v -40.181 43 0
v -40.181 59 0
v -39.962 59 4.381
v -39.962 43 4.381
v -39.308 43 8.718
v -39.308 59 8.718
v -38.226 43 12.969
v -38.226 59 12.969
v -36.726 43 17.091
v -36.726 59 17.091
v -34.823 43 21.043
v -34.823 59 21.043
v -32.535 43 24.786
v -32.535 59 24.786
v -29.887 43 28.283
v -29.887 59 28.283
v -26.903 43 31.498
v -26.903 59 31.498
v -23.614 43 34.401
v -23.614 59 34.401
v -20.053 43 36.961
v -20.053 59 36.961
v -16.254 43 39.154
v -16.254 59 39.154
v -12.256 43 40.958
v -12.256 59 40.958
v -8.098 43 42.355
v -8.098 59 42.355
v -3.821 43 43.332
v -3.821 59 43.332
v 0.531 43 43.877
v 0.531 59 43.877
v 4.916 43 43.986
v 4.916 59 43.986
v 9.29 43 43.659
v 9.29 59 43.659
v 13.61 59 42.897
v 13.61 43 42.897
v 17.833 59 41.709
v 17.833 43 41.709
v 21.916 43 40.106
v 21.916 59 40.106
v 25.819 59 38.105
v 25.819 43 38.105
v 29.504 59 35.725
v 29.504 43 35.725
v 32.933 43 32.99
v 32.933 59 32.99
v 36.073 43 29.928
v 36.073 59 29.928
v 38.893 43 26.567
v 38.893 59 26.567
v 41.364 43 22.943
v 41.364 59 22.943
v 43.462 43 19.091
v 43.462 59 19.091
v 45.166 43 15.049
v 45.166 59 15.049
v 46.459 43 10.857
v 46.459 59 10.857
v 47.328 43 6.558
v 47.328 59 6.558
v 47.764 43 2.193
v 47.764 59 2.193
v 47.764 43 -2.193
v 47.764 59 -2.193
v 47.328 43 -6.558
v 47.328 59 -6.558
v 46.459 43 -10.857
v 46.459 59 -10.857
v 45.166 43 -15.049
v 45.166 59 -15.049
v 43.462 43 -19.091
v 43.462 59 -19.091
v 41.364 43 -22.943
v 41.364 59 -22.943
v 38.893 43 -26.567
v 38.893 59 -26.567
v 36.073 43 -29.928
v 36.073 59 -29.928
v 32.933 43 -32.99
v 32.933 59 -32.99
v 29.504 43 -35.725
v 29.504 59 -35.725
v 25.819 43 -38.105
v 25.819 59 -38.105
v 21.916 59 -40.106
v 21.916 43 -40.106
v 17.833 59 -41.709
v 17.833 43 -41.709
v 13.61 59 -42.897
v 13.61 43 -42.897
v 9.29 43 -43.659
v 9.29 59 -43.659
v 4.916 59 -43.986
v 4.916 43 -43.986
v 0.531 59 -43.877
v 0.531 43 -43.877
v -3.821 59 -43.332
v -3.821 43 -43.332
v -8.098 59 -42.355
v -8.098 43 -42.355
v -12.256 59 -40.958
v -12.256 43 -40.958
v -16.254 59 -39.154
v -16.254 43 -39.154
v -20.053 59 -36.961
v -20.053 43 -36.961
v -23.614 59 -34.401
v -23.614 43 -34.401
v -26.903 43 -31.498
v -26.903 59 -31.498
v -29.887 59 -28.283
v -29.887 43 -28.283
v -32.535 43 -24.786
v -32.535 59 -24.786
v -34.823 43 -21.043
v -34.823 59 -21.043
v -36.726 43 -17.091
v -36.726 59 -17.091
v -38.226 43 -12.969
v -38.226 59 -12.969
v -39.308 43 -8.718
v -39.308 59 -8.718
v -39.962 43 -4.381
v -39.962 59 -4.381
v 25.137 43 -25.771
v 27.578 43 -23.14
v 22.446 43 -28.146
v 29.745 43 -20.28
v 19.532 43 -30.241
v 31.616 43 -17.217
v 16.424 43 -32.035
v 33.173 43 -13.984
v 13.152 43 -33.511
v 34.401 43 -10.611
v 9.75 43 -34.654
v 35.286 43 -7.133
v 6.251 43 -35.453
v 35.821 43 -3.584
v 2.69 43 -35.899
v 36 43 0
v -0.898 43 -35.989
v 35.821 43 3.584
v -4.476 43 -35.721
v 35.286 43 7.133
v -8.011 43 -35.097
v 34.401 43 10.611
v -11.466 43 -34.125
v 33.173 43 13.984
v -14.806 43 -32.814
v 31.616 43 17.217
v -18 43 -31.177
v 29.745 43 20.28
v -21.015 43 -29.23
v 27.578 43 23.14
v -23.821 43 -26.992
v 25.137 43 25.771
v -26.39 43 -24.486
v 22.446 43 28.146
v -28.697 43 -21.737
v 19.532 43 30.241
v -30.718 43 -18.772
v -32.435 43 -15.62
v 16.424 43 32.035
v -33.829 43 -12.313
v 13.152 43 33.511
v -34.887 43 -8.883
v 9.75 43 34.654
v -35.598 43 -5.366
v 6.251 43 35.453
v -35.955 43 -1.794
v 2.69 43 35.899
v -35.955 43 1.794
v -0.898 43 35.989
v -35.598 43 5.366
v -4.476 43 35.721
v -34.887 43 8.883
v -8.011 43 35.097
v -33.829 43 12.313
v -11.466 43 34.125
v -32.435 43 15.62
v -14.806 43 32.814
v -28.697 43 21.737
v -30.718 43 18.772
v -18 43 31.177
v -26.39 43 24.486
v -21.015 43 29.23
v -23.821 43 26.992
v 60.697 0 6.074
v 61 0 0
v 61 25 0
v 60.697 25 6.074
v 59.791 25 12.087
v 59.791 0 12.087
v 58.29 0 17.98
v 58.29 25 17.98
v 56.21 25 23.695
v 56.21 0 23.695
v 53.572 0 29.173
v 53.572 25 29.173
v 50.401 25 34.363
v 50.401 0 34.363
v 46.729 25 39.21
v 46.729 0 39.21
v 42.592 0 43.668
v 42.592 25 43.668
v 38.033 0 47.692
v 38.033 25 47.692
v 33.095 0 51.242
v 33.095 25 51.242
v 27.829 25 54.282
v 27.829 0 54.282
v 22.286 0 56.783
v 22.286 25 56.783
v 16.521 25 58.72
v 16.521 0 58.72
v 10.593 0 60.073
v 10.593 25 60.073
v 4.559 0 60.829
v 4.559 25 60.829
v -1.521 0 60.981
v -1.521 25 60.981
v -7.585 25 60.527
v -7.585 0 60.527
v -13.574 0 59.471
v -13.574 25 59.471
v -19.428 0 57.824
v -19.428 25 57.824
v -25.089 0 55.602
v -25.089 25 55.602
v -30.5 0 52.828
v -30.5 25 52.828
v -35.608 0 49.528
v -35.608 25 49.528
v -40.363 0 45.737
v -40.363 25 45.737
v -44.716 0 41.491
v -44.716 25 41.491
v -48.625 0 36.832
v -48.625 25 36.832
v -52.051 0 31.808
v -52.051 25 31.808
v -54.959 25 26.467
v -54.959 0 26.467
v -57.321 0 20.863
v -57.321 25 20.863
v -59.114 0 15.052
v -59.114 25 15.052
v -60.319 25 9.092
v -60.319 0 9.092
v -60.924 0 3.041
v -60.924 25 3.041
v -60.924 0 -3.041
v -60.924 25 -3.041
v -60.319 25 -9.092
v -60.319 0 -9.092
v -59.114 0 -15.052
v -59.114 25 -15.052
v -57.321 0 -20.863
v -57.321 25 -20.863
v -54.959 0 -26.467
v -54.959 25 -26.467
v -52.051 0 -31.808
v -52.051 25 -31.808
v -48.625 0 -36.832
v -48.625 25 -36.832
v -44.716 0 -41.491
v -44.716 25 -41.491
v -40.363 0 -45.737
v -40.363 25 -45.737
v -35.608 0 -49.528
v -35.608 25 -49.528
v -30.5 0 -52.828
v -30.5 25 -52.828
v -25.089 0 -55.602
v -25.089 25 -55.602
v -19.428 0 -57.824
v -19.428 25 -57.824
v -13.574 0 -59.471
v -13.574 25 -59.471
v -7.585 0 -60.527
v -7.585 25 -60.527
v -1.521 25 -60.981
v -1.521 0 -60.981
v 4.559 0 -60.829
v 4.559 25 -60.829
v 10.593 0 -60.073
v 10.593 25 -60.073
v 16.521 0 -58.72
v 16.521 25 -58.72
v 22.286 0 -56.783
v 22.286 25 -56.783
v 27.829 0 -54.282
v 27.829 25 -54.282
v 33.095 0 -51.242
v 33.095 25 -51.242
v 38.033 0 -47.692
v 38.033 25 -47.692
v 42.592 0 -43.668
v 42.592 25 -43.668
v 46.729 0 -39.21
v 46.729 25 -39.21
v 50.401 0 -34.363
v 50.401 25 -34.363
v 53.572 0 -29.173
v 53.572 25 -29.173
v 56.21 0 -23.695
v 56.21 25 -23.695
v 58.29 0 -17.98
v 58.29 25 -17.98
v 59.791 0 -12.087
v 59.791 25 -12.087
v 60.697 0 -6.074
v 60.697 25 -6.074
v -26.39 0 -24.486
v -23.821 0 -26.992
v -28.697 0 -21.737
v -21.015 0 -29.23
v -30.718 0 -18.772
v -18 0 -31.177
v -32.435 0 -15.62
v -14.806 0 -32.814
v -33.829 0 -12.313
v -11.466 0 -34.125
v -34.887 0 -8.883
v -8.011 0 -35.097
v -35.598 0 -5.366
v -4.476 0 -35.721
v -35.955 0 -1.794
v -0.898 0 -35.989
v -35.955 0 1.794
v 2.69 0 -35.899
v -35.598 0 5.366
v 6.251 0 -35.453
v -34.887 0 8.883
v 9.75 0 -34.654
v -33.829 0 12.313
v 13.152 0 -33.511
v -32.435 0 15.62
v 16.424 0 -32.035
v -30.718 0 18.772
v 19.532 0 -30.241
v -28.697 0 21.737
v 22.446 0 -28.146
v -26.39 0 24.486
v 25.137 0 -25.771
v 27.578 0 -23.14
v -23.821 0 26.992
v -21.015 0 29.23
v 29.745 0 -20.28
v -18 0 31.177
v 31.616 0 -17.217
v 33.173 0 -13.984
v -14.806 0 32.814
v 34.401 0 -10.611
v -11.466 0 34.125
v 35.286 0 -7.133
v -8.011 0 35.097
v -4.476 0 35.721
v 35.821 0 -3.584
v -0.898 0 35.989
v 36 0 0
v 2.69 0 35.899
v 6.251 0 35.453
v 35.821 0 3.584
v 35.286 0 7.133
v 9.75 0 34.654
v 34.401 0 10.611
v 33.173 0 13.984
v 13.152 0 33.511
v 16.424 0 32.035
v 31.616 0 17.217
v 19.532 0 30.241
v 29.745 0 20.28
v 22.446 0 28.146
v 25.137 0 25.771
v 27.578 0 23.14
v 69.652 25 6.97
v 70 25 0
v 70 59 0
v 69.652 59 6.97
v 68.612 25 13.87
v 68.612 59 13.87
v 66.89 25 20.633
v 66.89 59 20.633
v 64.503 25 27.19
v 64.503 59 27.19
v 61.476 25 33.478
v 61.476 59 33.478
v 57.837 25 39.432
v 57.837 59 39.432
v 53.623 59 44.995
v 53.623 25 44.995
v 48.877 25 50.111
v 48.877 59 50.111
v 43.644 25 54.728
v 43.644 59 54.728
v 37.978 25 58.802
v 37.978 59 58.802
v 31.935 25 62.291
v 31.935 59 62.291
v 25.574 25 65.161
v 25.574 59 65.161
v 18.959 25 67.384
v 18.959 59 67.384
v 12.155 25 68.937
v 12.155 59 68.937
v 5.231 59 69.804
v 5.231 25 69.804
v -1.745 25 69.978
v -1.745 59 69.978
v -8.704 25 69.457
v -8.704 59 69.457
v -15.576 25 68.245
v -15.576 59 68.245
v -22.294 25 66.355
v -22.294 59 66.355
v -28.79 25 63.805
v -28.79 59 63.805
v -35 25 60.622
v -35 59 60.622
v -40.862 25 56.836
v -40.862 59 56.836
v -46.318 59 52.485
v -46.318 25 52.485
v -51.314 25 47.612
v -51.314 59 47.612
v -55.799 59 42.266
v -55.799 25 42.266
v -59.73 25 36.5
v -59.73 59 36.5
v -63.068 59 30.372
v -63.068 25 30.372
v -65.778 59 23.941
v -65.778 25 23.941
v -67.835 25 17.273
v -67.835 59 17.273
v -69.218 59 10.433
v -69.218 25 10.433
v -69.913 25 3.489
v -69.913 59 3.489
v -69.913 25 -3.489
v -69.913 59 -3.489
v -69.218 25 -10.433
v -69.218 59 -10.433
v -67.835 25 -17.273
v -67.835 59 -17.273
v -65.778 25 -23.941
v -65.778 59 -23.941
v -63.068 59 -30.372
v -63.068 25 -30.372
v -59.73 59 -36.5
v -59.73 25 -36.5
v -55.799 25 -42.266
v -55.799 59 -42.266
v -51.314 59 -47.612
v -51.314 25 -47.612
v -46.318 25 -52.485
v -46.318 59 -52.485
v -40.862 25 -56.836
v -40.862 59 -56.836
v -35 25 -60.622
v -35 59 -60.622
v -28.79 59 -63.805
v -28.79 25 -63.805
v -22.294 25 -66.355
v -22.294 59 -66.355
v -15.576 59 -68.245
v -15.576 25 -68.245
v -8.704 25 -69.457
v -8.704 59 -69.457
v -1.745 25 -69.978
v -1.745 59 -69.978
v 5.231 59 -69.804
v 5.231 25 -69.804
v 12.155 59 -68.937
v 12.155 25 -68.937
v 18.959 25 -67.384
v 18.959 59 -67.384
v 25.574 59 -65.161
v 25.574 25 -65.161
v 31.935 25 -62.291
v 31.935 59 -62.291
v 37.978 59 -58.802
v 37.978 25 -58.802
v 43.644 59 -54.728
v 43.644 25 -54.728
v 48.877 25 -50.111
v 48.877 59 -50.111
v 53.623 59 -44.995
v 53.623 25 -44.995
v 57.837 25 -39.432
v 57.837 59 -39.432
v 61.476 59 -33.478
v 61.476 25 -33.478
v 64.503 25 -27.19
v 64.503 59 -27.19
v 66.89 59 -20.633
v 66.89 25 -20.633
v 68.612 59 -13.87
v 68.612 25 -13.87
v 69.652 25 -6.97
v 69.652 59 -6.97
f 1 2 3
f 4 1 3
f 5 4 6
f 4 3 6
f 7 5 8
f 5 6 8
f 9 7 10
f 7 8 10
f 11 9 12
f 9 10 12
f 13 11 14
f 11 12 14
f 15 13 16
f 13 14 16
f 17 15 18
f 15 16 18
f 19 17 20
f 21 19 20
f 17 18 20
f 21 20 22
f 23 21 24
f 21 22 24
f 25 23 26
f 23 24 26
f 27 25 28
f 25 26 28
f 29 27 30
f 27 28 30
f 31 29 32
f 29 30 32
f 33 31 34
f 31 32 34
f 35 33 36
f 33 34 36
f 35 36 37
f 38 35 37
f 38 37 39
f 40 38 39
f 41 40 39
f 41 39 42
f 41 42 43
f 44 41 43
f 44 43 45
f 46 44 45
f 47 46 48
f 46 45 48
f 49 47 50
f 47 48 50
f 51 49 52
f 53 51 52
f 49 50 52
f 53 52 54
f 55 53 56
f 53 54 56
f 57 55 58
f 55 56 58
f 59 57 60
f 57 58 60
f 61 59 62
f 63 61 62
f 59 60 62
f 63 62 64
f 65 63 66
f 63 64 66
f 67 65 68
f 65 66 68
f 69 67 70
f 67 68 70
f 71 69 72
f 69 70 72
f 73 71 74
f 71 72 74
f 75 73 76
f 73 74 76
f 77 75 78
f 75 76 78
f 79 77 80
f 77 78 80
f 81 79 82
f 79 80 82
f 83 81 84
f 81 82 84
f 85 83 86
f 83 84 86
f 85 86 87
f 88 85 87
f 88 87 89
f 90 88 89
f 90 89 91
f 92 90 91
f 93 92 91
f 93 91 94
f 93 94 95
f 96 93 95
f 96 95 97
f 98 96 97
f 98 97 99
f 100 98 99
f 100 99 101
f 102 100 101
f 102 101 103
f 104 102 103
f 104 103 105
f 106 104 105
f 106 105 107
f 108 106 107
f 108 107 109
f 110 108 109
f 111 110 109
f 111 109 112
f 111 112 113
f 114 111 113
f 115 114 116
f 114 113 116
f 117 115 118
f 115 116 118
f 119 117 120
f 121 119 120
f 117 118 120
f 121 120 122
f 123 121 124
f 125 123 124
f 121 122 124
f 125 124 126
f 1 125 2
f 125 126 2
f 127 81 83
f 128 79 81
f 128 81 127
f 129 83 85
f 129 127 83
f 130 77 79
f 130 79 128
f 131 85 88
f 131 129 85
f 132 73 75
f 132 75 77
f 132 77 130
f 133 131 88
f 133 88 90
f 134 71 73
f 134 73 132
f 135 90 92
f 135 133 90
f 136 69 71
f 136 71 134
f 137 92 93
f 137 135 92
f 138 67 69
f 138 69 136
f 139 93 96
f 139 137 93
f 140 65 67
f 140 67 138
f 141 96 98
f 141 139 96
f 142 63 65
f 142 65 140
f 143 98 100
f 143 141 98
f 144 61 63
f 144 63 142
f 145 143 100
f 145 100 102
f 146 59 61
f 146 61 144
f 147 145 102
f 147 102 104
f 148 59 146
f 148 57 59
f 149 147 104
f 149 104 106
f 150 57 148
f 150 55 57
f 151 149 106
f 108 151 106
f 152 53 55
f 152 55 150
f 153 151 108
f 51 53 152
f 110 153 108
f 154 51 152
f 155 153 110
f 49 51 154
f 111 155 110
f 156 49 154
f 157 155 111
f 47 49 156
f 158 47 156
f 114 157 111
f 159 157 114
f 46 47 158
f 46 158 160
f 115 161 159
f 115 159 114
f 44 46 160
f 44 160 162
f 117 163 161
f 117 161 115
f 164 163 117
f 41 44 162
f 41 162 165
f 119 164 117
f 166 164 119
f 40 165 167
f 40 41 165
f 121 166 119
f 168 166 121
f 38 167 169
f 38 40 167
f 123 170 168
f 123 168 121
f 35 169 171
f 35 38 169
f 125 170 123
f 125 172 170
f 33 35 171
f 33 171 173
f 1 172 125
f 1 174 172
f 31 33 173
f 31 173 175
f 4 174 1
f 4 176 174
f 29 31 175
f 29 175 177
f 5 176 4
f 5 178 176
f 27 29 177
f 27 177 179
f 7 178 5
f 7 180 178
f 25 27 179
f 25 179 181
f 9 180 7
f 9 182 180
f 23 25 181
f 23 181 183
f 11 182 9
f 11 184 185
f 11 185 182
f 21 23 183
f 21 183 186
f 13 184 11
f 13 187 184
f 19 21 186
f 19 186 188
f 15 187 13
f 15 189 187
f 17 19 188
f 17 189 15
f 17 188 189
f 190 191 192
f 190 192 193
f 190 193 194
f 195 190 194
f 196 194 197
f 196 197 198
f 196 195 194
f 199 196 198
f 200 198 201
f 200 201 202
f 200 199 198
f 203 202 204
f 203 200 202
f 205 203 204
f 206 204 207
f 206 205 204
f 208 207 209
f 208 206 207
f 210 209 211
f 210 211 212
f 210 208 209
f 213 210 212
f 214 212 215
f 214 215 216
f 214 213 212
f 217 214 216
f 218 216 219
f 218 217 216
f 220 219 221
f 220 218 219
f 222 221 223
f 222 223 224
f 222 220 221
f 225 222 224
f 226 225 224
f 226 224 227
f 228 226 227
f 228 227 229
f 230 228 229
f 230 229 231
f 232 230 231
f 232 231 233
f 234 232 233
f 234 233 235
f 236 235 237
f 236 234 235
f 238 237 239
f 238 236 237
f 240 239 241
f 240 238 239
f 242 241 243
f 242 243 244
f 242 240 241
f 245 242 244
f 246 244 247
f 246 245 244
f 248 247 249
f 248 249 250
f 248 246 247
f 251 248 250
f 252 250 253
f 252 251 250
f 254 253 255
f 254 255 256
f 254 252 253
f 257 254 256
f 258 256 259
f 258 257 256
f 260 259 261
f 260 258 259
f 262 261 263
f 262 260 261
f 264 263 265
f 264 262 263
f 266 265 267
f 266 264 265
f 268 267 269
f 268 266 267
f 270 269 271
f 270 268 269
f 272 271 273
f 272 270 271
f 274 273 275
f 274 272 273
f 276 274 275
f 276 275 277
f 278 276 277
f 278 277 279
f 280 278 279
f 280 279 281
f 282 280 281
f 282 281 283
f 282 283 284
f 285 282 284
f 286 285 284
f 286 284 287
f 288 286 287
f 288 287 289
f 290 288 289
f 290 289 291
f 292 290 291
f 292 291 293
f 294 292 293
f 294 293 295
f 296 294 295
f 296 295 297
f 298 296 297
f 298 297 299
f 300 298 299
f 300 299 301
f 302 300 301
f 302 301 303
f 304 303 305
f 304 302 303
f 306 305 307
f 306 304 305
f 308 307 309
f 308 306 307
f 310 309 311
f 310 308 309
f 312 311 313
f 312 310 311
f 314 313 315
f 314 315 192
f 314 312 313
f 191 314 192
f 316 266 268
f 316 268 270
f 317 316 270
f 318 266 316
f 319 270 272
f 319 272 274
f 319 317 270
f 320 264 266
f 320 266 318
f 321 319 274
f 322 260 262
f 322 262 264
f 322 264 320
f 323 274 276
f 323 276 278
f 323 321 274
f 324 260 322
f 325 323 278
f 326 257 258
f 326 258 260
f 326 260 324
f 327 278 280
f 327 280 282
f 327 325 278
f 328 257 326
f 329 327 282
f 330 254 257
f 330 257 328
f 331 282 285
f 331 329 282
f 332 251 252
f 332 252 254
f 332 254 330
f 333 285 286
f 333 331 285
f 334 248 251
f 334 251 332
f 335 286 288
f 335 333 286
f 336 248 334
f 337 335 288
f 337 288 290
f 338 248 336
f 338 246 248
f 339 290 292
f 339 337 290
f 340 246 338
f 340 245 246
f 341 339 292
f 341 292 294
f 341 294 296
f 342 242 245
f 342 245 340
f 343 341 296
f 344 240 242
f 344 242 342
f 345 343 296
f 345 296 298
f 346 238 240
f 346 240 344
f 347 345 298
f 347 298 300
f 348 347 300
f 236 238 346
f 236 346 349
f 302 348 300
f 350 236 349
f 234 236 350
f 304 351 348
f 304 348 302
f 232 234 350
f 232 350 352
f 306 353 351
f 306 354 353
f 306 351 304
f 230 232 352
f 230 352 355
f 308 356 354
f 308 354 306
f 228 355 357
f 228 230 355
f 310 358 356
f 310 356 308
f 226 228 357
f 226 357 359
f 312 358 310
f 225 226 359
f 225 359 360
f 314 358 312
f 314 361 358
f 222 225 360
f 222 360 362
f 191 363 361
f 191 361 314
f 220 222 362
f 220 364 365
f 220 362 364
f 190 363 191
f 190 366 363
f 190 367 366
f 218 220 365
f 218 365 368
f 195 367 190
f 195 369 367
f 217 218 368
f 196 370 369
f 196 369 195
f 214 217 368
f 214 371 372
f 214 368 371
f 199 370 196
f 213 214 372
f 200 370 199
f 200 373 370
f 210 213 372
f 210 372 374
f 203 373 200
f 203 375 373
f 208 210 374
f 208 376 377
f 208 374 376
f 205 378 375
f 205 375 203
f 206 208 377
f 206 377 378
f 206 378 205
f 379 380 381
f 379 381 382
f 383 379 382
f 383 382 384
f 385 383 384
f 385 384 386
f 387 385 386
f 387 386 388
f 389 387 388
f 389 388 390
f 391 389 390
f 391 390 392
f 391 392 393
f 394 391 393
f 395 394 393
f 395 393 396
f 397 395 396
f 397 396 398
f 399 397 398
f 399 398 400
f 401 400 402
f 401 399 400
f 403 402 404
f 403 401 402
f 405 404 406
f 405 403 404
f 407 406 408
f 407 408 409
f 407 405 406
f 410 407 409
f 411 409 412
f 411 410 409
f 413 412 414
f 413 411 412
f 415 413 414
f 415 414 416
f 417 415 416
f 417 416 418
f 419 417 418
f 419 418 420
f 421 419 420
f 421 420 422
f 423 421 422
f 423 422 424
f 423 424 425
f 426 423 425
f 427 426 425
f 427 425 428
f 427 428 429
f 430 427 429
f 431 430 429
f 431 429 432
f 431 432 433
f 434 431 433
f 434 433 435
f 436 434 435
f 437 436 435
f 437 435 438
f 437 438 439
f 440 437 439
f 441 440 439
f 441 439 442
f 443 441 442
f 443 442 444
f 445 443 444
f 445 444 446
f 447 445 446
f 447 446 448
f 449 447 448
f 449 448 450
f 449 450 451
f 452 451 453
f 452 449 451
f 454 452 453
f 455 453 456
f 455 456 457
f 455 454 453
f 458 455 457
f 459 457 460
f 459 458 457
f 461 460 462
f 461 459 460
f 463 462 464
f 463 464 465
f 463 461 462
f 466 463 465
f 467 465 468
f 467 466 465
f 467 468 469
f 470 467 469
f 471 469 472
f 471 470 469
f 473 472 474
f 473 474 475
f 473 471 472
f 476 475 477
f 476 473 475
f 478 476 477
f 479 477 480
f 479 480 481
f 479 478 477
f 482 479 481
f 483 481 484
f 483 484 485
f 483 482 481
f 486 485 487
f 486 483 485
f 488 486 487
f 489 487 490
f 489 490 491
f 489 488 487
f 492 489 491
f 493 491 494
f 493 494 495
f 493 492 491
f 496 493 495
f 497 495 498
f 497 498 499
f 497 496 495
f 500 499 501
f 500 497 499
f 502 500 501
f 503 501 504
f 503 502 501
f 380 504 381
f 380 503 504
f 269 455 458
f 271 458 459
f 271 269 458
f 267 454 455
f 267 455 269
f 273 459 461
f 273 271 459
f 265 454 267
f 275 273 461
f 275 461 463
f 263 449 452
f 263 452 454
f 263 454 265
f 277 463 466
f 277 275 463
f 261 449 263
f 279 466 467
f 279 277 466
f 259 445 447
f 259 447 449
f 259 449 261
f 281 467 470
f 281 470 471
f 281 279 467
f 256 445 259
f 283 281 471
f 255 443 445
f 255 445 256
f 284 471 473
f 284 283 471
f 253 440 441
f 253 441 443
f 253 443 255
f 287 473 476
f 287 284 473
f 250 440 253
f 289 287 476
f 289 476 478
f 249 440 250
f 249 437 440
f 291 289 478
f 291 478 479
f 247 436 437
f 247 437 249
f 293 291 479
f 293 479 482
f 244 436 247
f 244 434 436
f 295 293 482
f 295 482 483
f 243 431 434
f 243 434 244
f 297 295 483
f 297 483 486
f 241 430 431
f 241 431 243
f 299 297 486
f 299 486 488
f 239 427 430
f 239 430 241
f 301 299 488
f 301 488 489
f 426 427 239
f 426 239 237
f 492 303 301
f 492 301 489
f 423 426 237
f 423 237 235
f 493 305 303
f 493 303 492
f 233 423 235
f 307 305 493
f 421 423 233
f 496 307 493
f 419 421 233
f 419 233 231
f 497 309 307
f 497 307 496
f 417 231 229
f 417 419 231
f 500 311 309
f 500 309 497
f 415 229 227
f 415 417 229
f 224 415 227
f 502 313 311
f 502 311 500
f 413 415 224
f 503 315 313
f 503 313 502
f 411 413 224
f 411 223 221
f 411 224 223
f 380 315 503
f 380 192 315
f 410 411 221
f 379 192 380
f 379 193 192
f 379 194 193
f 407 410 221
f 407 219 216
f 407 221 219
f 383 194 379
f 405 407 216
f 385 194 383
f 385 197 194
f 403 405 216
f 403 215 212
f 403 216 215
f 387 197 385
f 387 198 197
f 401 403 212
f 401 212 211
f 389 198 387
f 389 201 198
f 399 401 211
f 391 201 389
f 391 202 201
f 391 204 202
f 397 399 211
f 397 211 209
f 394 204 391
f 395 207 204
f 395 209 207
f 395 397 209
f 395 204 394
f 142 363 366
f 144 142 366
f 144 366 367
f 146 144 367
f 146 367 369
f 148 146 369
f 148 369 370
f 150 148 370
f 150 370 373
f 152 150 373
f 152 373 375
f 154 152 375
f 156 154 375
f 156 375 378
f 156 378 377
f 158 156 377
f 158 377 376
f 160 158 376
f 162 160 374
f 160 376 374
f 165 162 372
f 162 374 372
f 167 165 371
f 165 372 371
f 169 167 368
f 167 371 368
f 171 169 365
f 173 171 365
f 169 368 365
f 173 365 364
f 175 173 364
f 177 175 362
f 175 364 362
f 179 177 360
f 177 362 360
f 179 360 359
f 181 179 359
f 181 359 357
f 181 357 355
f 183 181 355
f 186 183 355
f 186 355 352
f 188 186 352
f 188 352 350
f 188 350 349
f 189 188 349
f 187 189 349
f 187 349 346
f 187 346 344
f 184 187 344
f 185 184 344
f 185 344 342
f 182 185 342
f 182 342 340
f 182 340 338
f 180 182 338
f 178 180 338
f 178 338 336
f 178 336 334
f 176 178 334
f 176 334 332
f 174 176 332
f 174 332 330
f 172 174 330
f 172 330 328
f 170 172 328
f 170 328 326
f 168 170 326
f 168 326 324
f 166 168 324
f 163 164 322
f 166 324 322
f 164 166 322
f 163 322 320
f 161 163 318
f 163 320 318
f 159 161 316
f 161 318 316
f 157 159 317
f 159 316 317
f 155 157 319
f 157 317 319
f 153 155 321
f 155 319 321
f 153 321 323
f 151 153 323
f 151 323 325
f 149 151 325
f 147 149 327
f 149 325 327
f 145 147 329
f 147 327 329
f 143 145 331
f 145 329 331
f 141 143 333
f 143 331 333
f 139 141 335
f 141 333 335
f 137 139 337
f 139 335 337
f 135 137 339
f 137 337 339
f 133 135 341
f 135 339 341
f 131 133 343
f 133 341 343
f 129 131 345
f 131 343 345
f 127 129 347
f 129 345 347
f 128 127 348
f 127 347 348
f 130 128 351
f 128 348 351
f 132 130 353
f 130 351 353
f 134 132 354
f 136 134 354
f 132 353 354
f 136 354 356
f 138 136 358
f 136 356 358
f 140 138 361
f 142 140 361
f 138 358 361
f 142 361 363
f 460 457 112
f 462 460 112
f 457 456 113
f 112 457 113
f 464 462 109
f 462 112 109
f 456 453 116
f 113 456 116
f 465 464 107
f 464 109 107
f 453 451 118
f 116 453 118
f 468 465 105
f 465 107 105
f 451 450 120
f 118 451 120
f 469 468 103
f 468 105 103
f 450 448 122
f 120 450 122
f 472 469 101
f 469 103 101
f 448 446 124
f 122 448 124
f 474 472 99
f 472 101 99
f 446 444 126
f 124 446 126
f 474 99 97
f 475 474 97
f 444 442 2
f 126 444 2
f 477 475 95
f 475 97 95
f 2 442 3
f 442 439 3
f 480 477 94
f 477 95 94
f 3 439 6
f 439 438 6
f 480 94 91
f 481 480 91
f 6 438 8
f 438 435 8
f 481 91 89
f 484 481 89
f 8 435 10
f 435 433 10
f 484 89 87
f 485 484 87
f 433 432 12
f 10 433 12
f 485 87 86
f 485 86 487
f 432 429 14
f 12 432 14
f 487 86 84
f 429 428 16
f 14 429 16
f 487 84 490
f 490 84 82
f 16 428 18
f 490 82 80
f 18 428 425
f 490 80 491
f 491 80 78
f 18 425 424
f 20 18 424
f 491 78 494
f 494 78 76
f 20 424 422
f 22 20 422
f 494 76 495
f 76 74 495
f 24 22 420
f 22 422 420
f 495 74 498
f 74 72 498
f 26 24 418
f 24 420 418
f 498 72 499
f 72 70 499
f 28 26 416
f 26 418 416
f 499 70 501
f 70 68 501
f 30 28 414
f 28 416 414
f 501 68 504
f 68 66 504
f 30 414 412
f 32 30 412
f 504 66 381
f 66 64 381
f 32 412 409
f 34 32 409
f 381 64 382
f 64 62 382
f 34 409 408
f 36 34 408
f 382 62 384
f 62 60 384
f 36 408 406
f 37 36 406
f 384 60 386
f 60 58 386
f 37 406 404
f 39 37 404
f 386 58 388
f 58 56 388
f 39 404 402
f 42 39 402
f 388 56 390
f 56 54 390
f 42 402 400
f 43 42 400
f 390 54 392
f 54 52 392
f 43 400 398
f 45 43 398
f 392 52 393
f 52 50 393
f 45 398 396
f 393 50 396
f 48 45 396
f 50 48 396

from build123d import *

# Parameters (mm, degrees)
F0_R     = 70
F1_DEPTH = 59
F2_R     = 70
F2_R_2   = 61
F3_DEPTH = 25
F4_R     = 36
F5_DEPTH = 59
F6_R     = 44
F7_DEPTH = 16


with BuildPart() as f1:
    # F0 (on Front) → F1 (new body)
    with BuildSketch(Plane.XZ):
        Circle(F0_R)
    extrude(amount=-F1_DEPTH)

    # F2 (on face) → F3 (cut)
    with BuildSketch(Plane.XZ):
        Circle(F2_R)
        Circle(F2_R_2, mode=Mode.SUBTRACT)
    extrude(amount=-F3_DEPTH, mode=Mode.SUBTRACT)

    # F4 (on face) → F5 (cut, through all)
    with BuildSketch(Plane.XZ):
        Circle(F4_R)
    extrude(amount=-F5_DEPTH, mode=Mode.SUBTRACT)

    # F6 (on face) → F7 (cut)
    with BuildSketch(Plane(origin=(0, 59, 0), x_dir=(-1, 0, 0), z_dir=(0, 1, 0))):
        with Locations((-3.819107, 0)):
            Circle(F6_R)
    extrude(amount=-F7_DEPTH, mode=Mode.SUBTRACT)


solid = f1.part
